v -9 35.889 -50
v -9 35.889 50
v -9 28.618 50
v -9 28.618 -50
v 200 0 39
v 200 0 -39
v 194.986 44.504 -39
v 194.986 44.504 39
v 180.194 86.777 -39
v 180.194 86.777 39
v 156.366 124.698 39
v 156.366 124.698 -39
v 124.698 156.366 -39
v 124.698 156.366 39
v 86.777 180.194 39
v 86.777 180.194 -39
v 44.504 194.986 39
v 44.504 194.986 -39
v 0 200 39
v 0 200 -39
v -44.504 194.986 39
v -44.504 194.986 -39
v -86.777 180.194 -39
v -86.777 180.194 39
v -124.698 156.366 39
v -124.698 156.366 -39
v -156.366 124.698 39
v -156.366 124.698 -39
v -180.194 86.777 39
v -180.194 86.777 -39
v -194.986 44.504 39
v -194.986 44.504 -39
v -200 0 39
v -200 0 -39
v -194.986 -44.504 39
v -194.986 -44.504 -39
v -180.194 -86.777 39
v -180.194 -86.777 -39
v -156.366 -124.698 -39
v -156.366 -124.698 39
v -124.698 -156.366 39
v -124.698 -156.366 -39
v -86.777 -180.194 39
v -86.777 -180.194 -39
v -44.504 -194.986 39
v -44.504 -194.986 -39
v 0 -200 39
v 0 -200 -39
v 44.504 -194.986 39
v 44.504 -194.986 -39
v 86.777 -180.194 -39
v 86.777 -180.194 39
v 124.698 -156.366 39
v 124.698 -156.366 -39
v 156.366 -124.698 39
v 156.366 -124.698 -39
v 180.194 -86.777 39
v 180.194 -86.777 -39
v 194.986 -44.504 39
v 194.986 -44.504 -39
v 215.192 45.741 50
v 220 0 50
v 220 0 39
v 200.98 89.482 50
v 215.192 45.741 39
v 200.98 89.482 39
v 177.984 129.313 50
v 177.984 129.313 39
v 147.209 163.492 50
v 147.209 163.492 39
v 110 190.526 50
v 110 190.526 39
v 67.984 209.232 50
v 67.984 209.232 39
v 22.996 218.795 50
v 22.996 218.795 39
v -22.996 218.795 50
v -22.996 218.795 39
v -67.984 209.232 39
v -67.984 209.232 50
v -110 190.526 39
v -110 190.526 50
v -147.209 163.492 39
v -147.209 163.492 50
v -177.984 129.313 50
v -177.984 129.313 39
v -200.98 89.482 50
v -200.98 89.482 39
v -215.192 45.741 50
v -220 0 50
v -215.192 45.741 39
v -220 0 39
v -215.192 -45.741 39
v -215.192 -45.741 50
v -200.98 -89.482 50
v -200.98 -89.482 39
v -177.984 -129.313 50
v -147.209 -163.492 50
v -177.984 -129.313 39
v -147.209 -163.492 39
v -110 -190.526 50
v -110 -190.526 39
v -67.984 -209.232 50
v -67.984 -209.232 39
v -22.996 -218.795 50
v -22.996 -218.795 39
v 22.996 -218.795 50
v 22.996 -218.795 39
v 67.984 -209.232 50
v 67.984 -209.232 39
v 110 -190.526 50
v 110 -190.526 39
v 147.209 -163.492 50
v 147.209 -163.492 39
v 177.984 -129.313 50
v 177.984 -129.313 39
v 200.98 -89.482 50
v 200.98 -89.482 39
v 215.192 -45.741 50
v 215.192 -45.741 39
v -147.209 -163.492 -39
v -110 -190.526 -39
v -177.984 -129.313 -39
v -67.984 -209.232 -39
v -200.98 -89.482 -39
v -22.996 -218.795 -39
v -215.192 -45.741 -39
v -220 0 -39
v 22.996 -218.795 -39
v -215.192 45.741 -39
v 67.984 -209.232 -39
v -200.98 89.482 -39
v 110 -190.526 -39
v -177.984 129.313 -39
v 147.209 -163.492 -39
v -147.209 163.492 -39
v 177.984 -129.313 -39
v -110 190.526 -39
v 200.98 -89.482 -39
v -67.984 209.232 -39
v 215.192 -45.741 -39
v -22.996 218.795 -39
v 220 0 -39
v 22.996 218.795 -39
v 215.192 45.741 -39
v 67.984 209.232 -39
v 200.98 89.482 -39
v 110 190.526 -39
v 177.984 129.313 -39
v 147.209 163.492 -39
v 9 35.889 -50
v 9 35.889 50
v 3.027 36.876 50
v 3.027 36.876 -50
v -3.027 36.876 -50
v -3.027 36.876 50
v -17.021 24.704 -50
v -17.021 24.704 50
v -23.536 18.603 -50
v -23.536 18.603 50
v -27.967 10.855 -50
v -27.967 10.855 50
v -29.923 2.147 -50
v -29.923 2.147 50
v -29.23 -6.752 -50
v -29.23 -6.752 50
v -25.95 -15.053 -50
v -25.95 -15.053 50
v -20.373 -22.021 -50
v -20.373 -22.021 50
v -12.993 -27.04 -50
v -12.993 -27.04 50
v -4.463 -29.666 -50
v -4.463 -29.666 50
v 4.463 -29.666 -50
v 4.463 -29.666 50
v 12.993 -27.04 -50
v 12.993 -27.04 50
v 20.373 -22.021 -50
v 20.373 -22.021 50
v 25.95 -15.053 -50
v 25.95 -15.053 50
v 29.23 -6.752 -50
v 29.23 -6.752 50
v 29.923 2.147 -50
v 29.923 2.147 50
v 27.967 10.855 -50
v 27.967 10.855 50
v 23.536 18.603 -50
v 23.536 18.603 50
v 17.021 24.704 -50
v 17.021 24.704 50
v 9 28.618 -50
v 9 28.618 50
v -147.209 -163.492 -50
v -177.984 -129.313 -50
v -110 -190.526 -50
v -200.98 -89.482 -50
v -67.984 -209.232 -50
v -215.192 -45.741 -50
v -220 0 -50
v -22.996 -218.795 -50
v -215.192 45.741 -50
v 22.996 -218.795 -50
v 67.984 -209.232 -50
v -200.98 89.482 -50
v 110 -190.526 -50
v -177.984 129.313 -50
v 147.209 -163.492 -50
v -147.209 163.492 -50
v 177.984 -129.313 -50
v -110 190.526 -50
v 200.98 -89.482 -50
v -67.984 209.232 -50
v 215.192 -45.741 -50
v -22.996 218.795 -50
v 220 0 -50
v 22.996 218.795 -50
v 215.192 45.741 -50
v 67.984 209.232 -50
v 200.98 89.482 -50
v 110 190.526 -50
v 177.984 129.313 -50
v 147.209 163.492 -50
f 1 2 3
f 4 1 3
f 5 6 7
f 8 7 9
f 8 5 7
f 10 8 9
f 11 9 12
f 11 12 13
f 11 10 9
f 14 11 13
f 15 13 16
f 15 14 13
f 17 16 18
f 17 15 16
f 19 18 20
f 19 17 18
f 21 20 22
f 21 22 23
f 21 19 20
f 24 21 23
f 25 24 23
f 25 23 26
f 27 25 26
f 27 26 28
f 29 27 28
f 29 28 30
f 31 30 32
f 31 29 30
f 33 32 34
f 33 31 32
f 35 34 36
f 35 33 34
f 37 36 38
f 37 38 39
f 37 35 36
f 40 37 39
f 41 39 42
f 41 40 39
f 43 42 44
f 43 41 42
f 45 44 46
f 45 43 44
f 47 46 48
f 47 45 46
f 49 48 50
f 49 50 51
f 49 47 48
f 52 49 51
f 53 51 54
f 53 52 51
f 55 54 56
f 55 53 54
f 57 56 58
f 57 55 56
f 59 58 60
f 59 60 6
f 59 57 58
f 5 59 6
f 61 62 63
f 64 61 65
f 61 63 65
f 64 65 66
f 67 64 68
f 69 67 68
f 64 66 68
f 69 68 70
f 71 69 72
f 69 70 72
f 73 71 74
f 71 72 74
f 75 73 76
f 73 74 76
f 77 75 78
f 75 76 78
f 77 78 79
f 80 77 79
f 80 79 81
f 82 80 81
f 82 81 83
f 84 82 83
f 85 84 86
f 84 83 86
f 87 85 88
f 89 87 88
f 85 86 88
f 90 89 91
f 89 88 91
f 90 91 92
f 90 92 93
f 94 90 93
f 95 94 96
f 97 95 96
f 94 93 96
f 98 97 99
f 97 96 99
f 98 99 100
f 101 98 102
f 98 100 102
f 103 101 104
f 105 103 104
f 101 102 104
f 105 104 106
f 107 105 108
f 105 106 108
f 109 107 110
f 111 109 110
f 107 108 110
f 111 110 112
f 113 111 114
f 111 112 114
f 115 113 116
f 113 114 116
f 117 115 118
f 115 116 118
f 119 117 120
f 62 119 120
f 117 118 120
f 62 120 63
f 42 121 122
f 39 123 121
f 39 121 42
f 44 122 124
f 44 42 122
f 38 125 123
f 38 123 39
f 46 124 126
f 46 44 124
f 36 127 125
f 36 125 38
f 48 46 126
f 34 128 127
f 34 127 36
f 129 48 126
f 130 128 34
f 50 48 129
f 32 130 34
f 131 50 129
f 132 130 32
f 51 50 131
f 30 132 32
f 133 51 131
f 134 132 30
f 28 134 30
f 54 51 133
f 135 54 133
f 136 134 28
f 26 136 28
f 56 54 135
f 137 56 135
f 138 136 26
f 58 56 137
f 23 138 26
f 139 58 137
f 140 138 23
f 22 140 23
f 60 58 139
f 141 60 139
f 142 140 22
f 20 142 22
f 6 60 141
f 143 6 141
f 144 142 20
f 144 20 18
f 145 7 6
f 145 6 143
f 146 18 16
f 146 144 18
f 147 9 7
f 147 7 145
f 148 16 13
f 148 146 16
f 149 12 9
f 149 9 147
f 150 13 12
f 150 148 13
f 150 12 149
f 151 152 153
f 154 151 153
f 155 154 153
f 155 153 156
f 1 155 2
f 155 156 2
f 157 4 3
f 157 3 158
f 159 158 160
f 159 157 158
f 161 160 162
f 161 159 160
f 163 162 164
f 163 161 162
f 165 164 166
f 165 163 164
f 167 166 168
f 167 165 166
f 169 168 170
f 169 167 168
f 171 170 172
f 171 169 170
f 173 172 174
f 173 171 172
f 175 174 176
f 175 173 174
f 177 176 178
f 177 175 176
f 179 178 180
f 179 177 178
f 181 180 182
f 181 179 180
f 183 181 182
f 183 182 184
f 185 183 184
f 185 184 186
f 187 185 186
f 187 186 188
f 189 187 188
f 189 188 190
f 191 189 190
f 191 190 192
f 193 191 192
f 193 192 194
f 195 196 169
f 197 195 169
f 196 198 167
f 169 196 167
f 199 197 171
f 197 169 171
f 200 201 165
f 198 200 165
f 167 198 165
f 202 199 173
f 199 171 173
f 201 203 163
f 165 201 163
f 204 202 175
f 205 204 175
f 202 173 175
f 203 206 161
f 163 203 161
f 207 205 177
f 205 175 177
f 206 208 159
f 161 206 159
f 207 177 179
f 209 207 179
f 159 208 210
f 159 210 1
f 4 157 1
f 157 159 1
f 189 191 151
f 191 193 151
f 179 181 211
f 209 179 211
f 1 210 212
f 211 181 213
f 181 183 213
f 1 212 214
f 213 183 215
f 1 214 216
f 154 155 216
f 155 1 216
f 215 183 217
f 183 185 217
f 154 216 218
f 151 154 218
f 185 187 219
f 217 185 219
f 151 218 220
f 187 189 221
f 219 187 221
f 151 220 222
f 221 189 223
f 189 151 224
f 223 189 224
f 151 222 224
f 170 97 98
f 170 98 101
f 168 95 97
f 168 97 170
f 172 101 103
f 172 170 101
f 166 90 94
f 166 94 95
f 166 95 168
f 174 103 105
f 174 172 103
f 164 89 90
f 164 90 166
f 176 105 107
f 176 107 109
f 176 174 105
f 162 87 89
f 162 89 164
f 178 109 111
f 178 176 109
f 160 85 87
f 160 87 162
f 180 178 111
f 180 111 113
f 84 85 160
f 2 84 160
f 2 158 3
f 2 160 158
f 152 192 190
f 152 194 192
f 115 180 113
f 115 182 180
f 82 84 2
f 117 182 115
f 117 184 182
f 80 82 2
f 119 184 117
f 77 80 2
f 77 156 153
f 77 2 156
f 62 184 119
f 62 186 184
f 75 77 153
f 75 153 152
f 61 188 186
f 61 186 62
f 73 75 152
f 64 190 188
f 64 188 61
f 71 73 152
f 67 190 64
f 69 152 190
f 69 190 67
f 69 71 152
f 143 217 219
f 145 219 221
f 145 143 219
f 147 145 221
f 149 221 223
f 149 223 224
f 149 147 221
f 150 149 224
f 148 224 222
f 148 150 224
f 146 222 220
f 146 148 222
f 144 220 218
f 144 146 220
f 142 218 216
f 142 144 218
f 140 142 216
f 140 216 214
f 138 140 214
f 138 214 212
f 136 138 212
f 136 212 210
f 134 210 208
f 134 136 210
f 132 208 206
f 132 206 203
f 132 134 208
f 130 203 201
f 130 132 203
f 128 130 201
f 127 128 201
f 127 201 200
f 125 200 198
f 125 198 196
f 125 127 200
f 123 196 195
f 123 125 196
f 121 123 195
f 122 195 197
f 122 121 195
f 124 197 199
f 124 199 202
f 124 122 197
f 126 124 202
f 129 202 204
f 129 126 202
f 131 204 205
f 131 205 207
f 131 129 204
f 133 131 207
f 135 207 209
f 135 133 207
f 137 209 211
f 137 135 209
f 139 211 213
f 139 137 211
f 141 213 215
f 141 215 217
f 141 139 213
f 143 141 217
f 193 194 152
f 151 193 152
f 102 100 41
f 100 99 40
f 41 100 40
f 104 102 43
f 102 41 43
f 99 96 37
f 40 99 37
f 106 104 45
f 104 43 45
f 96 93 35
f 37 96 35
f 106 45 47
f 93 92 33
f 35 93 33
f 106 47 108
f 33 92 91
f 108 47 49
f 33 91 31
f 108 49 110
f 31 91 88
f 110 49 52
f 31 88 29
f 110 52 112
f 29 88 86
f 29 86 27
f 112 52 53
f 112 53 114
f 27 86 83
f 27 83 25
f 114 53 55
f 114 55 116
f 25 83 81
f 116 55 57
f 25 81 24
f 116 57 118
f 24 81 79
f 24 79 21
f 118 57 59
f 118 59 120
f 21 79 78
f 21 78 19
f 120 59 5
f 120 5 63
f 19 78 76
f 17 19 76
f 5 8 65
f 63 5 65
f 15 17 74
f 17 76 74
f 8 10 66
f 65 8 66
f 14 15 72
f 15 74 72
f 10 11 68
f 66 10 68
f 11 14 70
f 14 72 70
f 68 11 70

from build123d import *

# Parameters (mm, degrees)
SKETCH1_R           = 200
SKETCH1_R_2         = 30
BOSS_EXTRUDE1_DEPTH = 50
BOSS_EXTRUDE2_START = -11
SKETCH2_R           = 220
SKETCH2_R_2         = 30
BOSS_EXTRUDE2_DEPTH = 11
CUT_EXTRUDE1_DEPTH  = 327.802692767


with BuildPart() as part:
    # Sketch1 → Boss-Extrude1 (new, symmetric)
    with BuildSketch(Plane.XY):
        Circle(SKETCH1_R)
        Circle(SKETCH1_R_2, mode=Mode.SUBTRACT)
    extrude(amount=BOSS_EXTRUDE1_DEPTH, both=True)

    # Sketch2 → Boss-Extrude2 (add)
    with BuildSketch(Plane.XY.offset(50).offset(BOSS_EXTRUDE2_START)):
        Circle(SKETCH2_R)
        Circle(SKETCH2_R_2, mode=Mode.SUBTRACT)
    boss_extrude2 = extrude(amount=BOSS_EXTRUDE2_DEPTH)

    # Mirror1: Boss-Extrude2 across plane
    add(boss_extrude2.mirror(Plane.XY))

    # Sketch3 → Cut-Extrude1 (cut, through all)
    with BuildSketch(Plane.XY.offset(50)):
        with BuildLine():
            Line((9, 19.456611091), (9, 35.88871689))
            ThreePointArc((9, 35.88871689), (0, 37), (-9, 35.88871689))
            Line((-9, 35.88871689), (-9, 19.456611091))
            Line((-9, 19.456611091), (9, 19.456611091))
        make_face()
    extrude(amount=-CUT_EXTRUDE1_DEPTH, mode=Mode.SUBTRACT)


solid = part.part
